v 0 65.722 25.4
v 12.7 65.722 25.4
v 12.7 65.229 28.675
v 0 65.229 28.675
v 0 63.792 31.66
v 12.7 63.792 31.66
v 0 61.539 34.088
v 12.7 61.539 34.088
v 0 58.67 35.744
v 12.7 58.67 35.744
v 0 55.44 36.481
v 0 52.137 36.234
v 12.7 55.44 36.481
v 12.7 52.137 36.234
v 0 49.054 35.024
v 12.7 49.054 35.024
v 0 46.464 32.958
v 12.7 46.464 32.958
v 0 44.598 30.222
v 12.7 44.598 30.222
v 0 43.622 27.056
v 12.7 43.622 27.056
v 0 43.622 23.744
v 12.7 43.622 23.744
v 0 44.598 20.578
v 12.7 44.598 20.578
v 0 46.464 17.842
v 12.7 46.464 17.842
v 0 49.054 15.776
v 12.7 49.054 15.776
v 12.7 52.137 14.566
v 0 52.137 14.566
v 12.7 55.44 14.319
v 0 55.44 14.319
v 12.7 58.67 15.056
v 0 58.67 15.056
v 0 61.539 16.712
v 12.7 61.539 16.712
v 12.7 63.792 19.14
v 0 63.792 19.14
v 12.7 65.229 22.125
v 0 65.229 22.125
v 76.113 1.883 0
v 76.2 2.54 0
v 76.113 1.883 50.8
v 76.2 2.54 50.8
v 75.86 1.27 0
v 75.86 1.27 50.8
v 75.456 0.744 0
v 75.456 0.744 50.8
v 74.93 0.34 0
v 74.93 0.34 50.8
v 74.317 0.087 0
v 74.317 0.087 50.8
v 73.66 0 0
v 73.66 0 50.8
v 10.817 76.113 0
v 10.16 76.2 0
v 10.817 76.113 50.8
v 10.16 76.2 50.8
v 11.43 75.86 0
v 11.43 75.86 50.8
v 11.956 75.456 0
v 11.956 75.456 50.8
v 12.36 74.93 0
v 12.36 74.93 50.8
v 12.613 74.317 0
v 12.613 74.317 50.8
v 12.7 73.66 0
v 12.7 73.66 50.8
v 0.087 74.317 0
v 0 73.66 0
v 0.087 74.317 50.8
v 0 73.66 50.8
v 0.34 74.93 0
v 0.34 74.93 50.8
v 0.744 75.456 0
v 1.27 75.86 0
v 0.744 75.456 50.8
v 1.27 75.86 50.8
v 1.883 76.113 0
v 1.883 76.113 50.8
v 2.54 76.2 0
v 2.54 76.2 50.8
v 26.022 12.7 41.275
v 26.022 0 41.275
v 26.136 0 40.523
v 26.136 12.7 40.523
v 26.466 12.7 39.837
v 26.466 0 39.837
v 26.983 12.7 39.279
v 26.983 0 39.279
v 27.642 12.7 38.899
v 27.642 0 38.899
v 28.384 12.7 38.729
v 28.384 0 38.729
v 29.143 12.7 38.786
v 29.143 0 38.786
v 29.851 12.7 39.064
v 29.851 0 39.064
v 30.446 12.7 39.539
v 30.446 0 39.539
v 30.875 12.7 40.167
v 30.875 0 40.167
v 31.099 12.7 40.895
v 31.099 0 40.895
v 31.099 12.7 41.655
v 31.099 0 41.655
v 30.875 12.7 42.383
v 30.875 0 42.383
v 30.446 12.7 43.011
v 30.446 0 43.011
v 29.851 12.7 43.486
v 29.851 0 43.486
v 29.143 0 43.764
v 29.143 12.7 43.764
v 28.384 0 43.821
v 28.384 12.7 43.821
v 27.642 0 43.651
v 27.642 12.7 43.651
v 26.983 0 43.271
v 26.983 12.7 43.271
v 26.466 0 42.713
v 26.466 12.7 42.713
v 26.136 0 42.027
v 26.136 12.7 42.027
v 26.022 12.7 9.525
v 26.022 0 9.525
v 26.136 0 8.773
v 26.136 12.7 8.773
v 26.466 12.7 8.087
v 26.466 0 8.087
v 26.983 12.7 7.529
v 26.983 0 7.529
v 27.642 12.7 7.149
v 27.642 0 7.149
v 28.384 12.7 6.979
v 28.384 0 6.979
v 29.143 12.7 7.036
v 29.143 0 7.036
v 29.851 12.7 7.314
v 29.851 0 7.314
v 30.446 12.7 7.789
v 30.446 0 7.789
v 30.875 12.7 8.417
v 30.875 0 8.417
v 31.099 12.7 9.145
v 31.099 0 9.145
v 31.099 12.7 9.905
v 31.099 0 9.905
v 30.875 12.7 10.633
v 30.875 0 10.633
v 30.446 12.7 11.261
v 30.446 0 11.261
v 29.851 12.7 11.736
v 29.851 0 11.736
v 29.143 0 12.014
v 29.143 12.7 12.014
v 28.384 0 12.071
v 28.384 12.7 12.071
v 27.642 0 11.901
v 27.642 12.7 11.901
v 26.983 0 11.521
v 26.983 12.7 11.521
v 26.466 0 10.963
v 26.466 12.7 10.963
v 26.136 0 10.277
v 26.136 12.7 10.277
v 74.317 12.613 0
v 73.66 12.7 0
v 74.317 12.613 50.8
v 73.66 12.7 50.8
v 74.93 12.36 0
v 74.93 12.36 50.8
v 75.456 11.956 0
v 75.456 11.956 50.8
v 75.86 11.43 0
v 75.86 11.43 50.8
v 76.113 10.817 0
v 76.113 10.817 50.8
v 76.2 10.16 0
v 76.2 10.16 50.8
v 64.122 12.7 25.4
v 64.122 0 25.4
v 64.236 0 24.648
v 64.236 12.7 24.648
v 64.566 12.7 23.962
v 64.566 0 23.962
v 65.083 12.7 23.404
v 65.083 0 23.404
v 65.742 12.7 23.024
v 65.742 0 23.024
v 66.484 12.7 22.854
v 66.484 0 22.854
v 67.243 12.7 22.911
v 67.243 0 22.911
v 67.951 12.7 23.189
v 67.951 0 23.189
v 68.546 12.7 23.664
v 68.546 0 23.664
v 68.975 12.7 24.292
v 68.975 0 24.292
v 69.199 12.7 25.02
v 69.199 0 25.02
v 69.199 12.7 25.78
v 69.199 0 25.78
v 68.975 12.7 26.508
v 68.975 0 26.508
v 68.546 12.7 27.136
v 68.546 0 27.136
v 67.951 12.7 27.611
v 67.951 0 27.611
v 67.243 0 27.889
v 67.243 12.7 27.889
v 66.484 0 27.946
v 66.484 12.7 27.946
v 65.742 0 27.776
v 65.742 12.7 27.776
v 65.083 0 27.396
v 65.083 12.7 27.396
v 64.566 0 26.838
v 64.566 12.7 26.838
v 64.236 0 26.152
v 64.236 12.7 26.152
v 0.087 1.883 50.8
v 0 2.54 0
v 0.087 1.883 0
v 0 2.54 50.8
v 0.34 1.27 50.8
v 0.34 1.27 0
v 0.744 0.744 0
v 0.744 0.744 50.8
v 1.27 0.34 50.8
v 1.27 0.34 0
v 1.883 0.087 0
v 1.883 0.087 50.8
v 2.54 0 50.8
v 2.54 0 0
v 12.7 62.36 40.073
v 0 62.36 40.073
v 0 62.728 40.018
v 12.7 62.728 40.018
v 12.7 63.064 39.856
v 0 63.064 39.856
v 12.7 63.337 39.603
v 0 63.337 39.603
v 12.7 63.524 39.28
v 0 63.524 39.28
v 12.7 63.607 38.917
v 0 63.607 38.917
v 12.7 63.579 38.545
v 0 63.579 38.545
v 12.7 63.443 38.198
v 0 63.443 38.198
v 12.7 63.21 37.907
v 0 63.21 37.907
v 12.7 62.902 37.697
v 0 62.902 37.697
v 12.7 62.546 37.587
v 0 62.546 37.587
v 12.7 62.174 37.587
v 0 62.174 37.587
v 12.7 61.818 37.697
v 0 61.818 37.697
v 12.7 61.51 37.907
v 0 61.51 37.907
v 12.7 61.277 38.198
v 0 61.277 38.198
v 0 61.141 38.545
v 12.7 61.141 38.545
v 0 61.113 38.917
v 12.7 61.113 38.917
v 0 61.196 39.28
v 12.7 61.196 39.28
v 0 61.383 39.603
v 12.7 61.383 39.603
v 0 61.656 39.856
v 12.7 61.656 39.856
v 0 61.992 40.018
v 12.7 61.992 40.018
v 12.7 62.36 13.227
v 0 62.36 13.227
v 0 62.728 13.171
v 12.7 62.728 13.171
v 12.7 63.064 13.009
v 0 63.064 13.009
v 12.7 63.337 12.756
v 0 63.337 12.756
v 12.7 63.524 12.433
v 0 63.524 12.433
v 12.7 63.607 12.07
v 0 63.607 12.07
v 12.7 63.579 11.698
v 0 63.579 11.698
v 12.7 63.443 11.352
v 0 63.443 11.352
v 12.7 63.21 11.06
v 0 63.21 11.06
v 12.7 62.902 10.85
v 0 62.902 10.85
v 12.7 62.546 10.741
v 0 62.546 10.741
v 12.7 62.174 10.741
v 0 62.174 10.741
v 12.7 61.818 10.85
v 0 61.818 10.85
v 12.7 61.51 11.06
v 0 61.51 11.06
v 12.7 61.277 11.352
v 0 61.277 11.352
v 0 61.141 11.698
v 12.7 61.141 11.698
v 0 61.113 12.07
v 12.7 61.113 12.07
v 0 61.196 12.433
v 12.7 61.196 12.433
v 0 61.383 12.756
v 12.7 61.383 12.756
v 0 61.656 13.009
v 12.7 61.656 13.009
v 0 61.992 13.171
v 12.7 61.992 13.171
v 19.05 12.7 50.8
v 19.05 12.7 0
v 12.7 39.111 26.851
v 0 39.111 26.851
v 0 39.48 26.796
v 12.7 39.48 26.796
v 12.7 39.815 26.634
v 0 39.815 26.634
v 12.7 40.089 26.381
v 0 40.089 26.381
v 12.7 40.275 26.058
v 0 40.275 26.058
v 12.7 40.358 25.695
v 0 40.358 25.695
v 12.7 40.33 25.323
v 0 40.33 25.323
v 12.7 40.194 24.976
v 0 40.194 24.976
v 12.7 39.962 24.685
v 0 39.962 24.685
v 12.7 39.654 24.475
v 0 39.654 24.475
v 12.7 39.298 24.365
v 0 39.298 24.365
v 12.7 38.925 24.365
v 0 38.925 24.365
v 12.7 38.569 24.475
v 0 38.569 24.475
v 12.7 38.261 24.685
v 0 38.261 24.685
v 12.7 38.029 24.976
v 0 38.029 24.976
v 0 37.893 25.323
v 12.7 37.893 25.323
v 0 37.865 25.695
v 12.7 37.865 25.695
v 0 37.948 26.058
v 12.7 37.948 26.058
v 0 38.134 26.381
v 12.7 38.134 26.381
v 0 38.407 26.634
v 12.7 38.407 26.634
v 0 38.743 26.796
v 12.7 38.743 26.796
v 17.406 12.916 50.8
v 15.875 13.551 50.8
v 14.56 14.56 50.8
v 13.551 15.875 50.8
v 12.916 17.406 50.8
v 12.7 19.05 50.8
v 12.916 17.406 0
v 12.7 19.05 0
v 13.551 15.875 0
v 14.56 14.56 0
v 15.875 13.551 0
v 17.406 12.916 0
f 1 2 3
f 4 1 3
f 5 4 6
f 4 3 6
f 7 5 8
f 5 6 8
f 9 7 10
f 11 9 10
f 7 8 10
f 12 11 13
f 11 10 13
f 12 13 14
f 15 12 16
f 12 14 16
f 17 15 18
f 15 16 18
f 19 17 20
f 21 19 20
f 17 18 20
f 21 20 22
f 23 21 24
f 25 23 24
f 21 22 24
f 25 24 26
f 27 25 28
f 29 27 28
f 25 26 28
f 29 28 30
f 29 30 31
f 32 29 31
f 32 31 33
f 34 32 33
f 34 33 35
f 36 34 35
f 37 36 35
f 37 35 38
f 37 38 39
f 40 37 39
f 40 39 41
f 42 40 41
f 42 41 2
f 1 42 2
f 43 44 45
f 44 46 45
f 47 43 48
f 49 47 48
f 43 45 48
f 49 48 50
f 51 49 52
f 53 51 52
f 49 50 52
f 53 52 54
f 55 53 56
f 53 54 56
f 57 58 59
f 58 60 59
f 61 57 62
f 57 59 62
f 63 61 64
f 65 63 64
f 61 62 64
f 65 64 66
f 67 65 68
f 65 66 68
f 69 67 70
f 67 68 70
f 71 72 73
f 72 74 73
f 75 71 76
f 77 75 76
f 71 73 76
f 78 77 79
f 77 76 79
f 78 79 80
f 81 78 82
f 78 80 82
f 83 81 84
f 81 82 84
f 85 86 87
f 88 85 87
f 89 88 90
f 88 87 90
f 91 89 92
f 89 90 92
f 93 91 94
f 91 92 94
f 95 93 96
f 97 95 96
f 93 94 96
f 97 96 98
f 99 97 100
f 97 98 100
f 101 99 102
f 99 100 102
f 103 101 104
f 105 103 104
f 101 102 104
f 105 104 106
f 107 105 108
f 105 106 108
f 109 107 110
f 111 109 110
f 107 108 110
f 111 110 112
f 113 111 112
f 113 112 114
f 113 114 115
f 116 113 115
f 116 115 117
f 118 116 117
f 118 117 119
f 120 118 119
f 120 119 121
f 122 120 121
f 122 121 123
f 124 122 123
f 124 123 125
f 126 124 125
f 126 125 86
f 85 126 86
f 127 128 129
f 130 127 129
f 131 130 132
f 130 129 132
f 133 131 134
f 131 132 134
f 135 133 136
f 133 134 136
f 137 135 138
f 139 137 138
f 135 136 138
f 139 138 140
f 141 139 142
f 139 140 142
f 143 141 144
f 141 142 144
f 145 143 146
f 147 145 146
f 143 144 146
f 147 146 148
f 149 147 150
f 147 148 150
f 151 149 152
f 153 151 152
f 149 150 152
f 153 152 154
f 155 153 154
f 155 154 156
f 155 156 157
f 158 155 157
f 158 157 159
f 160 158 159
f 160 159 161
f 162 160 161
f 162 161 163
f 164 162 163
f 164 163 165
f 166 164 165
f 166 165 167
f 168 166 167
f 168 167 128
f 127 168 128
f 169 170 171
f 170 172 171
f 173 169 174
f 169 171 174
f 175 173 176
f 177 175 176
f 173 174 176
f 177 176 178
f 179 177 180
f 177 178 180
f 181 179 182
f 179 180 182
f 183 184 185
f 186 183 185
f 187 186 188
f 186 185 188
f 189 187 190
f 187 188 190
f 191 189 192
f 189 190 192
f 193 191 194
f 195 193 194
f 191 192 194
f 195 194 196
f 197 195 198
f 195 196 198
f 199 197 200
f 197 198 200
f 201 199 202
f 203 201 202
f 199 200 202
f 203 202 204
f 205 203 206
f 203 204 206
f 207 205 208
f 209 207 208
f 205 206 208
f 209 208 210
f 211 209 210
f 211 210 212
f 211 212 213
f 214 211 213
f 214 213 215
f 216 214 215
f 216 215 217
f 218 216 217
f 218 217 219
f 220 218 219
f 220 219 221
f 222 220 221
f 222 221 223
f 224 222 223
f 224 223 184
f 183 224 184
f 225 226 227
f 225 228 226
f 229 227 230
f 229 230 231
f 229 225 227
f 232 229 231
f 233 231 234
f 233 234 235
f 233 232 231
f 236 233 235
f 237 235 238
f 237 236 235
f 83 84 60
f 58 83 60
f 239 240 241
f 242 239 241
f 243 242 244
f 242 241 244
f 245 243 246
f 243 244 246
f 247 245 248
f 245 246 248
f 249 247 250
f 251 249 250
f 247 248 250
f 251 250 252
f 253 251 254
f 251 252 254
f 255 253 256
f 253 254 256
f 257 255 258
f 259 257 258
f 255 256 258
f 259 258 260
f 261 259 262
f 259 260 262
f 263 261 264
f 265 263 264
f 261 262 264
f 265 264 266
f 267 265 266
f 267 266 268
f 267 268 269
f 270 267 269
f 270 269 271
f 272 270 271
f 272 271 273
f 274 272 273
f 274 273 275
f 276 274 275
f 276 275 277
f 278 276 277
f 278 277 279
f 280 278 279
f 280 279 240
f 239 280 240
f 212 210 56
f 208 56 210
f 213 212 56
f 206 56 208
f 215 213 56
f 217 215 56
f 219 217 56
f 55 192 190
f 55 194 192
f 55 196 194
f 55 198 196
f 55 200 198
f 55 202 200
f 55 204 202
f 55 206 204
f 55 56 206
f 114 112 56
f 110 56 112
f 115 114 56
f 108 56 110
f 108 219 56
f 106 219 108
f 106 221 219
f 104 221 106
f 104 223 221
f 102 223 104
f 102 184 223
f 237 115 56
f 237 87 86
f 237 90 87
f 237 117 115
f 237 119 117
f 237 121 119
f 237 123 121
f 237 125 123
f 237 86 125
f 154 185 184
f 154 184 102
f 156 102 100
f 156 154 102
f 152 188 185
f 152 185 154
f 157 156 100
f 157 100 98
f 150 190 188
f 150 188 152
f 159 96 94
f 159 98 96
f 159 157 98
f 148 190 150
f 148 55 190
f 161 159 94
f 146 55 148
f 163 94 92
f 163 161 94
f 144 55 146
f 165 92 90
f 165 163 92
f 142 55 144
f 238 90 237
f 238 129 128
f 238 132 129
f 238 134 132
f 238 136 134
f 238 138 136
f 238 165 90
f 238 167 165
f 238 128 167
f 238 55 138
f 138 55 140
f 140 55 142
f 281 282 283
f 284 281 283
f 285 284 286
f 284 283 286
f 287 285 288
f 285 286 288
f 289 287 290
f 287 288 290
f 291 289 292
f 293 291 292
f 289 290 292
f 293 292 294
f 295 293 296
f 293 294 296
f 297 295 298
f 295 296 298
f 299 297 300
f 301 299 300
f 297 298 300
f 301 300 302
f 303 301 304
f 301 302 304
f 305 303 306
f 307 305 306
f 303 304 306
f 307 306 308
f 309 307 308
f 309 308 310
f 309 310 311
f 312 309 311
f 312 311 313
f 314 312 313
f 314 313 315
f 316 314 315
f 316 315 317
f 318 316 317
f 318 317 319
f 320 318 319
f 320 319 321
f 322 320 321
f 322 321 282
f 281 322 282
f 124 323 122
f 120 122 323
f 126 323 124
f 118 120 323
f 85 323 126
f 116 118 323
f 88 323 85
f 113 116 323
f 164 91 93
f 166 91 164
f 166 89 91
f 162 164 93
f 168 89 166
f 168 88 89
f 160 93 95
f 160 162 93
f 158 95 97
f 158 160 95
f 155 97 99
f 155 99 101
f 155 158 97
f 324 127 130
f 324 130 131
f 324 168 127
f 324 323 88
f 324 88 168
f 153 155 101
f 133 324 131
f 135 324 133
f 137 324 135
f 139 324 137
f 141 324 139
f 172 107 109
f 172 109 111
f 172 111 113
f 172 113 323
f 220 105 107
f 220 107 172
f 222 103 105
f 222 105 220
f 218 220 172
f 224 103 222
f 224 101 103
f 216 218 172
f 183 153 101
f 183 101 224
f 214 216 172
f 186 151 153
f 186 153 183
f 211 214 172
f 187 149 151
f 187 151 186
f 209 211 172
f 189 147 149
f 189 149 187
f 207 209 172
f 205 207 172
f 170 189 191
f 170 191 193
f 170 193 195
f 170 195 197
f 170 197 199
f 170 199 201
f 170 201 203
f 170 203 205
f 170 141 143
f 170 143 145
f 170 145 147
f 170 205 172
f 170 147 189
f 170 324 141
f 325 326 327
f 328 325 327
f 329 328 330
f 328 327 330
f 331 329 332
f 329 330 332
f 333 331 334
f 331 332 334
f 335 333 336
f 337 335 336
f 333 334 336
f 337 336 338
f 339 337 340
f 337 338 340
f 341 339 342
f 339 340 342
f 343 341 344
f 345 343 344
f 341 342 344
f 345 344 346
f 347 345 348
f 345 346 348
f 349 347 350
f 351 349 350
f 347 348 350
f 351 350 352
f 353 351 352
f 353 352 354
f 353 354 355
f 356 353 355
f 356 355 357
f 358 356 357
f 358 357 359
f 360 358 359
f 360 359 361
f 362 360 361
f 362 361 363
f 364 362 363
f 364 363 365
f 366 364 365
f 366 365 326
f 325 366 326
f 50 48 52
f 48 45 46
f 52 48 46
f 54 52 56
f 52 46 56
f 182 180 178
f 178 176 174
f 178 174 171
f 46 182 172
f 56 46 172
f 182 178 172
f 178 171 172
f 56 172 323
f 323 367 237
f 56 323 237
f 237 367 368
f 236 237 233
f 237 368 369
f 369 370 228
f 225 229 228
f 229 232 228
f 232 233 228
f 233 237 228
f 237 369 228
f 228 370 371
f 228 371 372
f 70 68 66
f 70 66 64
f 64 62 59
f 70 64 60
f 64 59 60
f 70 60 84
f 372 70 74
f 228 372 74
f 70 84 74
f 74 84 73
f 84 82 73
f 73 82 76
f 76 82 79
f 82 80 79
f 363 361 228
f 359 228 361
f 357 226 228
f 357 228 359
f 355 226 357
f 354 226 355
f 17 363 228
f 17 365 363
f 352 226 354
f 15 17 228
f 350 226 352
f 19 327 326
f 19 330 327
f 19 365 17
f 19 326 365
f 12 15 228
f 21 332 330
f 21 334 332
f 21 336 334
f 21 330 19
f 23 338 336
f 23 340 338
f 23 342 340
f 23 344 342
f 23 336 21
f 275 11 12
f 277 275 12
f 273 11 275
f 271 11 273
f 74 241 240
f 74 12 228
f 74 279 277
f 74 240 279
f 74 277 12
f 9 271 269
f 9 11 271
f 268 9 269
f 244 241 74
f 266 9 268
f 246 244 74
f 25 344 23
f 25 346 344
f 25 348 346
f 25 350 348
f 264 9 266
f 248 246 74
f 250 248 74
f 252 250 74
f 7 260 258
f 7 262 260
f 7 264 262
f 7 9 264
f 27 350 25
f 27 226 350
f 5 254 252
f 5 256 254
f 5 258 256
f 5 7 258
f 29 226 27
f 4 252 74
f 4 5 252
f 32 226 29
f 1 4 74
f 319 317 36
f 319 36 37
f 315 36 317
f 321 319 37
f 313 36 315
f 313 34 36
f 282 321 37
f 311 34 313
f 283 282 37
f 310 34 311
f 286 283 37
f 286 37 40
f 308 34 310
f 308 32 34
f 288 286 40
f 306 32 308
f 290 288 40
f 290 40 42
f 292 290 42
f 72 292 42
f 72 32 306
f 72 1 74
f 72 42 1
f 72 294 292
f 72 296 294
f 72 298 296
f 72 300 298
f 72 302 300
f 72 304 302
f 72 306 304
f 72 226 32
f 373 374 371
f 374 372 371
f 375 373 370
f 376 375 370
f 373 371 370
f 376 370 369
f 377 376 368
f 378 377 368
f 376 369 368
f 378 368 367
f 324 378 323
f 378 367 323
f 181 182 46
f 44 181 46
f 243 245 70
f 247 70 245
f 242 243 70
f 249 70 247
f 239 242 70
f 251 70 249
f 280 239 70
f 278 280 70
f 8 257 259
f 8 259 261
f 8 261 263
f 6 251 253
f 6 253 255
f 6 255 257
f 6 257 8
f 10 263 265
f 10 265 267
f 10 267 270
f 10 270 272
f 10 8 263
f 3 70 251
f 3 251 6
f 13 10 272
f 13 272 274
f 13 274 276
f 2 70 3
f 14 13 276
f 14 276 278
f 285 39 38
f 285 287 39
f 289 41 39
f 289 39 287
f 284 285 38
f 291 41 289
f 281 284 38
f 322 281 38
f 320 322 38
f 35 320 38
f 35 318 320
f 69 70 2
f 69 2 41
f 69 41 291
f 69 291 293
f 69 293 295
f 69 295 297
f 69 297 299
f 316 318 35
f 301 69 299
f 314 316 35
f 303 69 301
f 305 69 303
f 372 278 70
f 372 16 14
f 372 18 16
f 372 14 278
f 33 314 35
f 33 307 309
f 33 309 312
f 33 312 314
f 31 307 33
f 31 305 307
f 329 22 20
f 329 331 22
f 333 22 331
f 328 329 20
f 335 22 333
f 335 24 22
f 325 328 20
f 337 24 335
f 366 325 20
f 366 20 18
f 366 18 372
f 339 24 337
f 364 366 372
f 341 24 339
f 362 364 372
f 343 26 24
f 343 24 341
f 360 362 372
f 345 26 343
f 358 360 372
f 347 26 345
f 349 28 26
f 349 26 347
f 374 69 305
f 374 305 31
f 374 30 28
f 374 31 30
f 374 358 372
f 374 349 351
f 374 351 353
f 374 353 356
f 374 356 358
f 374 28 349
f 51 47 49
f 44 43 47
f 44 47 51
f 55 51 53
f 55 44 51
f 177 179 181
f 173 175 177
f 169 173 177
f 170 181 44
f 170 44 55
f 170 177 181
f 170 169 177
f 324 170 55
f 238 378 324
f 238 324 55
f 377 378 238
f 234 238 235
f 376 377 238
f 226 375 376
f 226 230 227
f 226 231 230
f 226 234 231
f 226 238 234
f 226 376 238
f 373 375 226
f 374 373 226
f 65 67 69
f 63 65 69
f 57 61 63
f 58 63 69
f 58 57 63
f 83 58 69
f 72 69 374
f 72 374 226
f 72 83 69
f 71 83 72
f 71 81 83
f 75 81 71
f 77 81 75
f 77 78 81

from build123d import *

# Parameters (mm, degrees)
BOSS_EXTRUDE1_DEPTH     = 50.8
FILLET1_R               = 2.54
FILLET2_R               = 6.35
SKETCH2_R               = 11.1125
CUT_EXTRUDE1_DEPTH      = 112.44204772
M3X0_5_TAPPED_HOLE1_D   = 2.5
F_1_4_20_TAPPED_HOLE1_D = 5.1054


with BuildPart() as part:
    # Sketch1 → Boss-Extrude1 (new body)
    with BuildSketch(Plane.XY):
        Polygon((0, 0), (0, 76.2), (12.7, 76.2), (12.7, 12.7), (76.2, 12.7), (76.2, 0), align=None)
    extrude(amount=BOSS_EXTRUDE1_DEPTH)

    # Fillet1
    fillet1_edges = [part.edges().sort_by_distance(p)[0] for p in [
        (0, 0, 25.4),
        (0, 76.2, 25.4),
        (12.7, 76.2, 25.4),
        (76.2, 12.7, 25.4),
        (76.2, 0, 25.4),
    ]]
    fillet(fillet1_edges, radius=FILLET1_R)

    # Fillet2
    fillet2_edges = [part.edges().sort_by_distance(p)[0] for p in [
        (12.7, 12.7, 25.4),
    ]]
    fillet(fillet2_edges, radius=FILLET2_R)

    # Sketch2 → Cut-Extrude1 (cut, through all)
    with BuildSketch(Plane(origin=(12.7, 0, 0), x_dir=(0, 0, -1), z_dir=(1, 0, 0))):
        with Locations(Location((-25.4, 54.61, 0), (0, 0, 90))):
            Circle(SKETCH2_R)
    extrude(amount=-CUT_EXTRUDE1_DEPTH, mode=Mode.SUBTRACT)

    # M3x0.5 Tapped Hole1 (through all)
    with Locations(Plane(origin=(12.7, 0, 0), x_dir=(0, 0, -1), z_dir=(1, 0, 0))):
        with Locations((-38.823393759, 62.36), (-11.976606241, 62.36), (-25.601459668, 39.111309281)):
            Hole(M3X0_5_TAPPED_HOLE1_D / 2)

    # 1/4-20 Tapped Hole1 (through all)
    with Locations(Plane(origin=(0, 12.7, 0), x_dir=(1, 0, 0), z_dir=(0, 1, 0))):
        with Locations((28.575, -9.525), (28.575, -41.275), (66.675, -25.4)):
            Hole(F_1_4_20_TAPPED_HOLE1_D / 2)


solid = part.part
